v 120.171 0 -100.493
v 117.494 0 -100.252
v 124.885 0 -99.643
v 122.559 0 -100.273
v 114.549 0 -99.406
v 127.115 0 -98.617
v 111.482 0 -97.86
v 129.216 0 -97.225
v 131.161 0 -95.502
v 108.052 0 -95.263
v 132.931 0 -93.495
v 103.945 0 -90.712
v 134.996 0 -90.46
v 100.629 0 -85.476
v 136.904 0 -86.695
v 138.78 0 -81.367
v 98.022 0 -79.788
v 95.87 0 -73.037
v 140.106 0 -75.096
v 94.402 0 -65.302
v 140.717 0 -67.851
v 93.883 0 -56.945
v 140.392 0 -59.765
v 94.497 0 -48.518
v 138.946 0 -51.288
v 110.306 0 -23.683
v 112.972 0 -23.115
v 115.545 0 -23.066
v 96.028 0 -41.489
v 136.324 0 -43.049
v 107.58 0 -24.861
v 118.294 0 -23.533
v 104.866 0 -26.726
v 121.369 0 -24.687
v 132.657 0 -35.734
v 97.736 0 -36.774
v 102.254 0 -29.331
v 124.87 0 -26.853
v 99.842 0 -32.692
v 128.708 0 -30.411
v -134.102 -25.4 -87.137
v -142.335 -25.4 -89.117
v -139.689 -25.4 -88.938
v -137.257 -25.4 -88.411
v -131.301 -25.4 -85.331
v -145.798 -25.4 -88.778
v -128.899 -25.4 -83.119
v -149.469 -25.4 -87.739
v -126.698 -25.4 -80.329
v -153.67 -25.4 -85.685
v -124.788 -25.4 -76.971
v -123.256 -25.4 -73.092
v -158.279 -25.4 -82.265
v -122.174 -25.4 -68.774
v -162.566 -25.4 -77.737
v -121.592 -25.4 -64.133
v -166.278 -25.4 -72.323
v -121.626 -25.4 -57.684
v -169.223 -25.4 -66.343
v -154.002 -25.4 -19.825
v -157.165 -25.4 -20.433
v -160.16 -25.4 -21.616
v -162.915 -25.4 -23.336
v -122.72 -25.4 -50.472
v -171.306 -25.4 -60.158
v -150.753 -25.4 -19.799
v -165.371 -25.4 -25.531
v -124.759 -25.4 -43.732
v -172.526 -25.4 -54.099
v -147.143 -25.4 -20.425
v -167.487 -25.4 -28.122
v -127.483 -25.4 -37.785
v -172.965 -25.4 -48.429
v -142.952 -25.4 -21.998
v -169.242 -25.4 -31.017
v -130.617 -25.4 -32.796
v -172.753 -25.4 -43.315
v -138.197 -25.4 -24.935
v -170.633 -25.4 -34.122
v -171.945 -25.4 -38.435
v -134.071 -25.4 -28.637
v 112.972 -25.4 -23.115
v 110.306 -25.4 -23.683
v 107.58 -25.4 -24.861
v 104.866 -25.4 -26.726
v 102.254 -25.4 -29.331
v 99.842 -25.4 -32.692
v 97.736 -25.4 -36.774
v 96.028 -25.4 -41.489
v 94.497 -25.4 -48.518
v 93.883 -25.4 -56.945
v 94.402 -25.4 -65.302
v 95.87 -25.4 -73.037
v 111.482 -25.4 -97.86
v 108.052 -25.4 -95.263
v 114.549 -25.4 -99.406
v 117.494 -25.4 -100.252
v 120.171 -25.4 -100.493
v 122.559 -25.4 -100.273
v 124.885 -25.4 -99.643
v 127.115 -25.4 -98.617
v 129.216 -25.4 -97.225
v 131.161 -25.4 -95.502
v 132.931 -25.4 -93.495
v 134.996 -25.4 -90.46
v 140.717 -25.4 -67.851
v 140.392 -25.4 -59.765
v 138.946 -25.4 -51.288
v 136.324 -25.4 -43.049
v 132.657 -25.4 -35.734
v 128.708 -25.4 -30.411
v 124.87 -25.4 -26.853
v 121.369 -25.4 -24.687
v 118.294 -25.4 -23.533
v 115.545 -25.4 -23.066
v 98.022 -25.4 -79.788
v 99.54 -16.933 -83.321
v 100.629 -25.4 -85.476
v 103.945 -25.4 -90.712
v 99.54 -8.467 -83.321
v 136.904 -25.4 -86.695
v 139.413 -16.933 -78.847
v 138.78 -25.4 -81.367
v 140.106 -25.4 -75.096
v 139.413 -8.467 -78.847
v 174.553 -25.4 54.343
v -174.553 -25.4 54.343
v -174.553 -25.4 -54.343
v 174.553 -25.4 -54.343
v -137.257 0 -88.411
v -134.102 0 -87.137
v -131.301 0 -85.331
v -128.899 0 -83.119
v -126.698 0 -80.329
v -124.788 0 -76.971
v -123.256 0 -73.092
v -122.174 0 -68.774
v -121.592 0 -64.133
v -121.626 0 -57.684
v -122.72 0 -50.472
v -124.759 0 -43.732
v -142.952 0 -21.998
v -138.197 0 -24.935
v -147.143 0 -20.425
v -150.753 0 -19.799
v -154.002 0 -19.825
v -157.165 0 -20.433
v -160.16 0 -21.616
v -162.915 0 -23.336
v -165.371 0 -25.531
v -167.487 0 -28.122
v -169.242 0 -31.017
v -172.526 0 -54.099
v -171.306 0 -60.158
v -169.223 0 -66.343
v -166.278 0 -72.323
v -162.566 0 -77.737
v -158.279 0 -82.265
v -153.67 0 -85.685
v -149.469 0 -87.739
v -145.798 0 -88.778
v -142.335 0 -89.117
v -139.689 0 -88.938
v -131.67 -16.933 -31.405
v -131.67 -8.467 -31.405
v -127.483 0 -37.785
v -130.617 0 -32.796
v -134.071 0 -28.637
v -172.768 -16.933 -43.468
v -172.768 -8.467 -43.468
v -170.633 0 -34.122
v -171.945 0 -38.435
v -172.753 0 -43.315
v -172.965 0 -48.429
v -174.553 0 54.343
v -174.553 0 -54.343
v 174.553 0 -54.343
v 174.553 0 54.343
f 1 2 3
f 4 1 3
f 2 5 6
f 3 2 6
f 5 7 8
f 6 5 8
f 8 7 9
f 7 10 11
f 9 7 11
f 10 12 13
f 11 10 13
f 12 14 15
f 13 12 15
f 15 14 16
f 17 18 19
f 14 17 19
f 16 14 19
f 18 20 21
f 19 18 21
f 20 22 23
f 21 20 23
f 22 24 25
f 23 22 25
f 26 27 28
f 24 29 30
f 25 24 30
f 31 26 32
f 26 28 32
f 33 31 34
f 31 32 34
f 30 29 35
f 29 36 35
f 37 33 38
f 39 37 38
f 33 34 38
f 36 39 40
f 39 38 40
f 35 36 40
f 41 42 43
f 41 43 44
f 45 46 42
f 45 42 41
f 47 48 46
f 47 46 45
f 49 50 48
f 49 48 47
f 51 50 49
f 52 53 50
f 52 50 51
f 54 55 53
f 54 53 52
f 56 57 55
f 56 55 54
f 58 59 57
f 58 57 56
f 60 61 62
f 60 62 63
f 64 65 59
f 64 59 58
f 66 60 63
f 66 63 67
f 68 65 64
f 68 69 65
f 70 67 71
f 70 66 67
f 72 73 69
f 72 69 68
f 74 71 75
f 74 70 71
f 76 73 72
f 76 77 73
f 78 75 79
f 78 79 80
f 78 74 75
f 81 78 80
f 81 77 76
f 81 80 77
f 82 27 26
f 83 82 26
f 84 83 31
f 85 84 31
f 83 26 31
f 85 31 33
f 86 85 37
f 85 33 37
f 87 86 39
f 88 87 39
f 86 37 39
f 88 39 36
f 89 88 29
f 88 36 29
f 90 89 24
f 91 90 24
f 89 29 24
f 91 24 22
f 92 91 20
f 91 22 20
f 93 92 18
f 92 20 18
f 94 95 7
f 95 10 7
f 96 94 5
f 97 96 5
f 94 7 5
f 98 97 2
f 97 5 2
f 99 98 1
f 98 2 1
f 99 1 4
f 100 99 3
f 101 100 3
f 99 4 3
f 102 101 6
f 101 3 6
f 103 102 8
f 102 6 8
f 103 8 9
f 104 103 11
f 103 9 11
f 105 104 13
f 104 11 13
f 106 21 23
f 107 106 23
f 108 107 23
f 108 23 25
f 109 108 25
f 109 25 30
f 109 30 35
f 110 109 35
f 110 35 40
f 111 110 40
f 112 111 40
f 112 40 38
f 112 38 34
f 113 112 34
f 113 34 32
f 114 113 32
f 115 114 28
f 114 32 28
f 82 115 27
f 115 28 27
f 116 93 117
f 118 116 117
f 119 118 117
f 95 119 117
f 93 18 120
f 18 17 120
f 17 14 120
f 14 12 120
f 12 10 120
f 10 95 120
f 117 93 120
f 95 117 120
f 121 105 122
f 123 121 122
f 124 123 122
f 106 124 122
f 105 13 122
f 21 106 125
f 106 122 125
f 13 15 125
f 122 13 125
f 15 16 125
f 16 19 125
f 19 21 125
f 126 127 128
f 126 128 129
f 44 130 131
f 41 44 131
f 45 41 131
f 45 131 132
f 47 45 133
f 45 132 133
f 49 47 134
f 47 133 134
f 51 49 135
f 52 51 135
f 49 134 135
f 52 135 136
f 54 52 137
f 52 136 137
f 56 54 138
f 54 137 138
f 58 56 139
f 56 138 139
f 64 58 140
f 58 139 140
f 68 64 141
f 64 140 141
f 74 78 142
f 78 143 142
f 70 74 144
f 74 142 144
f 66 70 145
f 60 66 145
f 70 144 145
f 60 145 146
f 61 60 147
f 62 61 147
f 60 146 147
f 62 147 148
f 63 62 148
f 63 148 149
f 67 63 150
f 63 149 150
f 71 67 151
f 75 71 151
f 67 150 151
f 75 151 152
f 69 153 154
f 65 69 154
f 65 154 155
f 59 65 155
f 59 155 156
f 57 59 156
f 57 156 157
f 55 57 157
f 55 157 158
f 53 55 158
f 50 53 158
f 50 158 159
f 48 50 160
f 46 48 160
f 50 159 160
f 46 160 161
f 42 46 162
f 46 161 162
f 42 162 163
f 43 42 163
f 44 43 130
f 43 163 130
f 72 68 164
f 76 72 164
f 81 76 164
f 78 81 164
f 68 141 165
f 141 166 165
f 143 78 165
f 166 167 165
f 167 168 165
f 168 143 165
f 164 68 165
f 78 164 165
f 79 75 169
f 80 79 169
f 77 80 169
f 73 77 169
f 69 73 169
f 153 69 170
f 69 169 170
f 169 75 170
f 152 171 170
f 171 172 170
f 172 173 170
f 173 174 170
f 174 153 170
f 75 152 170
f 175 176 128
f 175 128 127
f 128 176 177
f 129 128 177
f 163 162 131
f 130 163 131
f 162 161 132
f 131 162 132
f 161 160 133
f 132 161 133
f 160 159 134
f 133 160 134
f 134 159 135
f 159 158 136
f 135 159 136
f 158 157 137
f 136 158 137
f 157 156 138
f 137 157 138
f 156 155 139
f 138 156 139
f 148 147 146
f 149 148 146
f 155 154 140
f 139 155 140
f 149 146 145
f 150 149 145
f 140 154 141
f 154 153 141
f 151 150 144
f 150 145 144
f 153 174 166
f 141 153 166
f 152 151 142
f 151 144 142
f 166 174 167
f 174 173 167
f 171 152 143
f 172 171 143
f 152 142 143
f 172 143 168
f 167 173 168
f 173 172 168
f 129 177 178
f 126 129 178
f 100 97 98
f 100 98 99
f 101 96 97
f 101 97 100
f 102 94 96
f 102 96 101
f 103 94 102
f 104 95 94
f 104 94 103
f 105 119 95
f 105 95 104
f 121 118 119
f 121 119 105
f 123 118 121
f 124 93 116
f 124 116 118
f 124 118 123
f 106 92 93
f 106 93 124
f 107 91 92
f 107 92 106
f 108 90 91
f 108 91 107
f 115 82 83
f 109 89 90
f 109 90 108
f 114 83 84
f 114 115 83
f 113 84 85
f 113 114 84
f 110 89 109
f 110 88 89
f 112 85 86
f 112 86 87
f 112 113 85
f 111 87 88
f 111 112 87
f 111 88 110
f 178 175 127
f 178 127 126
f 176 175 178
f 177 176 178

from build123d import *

# Parameters (mm, degrees)
F0_W     = 349.1063117981
F0_H     = 108.6854711175
F2_DEPTH = 25.4


with BuildPart() as f2:
    # F0 (on Front) → F2 (new body)
    with BuildSketch(Plane.XZ):
        Rectangle(F0_W, F0_H)
    extrude(amount=F2_DEPTH)


with BuildPart() as f2b:
    # F1 (on Front) → F2, piece 2 (new body)
    with BuildSketch(Plane.XZ):
        with BuildLine():
            add(Edge.make_bspline(
                [(112.971663475, -23.1147967279), (73.0984838268, -27.5892411071), (99.5401681195, -83.3209595034), (125.9818524122, -139.0526778996), (139.4133477677, -78.8465151241), (152.8448431232, -18.6403523487), (112.971663475, -23.1147967279)],
                knots=[0, 0, 0, 2.0943951024, 2.0943951024, 4.1887902048, 4.1887902048, 6.2831853072, 6.2831853072, 6.2831853072], degree=2, weights=[1, 0.5, 1, 0.5, 1, 0.5, 1]))
        make_face()
    extrude(amount=F2_DEPTH)


with BuildPart() as f2c:
    # F1 (on Front) → F2, piece 3 (new body)
    with BuildSketch(Plane.XZ):
        with BuildLine():
            add(Edge.make_bspline(
                [(-137.257322669, -88.4109213948), (-96.1590567124, -76.3479501494), (-131.6698868519, -31.4052772019), (-167.1807169914, 13.5373957455), (-172.7681528085, -43.4682484474), (-178.3555886256, -100.4738926403), (-137.257322669, -88.4109213948)],
                knots=[0, 0, 0, 2.0943951024, 2.0943951024, 4.1887902048, 4.1887902048, 6.2831853072, 6.2831853072, 6.2831853072], degree=2, weights=[1, 0.5, 1, 0.5, 1, 0.5, 1]))
        make_face()
    extrude(amount=F2_DEPTH)


solid = Compound([f2.part, f2b.part, f2c.part])
